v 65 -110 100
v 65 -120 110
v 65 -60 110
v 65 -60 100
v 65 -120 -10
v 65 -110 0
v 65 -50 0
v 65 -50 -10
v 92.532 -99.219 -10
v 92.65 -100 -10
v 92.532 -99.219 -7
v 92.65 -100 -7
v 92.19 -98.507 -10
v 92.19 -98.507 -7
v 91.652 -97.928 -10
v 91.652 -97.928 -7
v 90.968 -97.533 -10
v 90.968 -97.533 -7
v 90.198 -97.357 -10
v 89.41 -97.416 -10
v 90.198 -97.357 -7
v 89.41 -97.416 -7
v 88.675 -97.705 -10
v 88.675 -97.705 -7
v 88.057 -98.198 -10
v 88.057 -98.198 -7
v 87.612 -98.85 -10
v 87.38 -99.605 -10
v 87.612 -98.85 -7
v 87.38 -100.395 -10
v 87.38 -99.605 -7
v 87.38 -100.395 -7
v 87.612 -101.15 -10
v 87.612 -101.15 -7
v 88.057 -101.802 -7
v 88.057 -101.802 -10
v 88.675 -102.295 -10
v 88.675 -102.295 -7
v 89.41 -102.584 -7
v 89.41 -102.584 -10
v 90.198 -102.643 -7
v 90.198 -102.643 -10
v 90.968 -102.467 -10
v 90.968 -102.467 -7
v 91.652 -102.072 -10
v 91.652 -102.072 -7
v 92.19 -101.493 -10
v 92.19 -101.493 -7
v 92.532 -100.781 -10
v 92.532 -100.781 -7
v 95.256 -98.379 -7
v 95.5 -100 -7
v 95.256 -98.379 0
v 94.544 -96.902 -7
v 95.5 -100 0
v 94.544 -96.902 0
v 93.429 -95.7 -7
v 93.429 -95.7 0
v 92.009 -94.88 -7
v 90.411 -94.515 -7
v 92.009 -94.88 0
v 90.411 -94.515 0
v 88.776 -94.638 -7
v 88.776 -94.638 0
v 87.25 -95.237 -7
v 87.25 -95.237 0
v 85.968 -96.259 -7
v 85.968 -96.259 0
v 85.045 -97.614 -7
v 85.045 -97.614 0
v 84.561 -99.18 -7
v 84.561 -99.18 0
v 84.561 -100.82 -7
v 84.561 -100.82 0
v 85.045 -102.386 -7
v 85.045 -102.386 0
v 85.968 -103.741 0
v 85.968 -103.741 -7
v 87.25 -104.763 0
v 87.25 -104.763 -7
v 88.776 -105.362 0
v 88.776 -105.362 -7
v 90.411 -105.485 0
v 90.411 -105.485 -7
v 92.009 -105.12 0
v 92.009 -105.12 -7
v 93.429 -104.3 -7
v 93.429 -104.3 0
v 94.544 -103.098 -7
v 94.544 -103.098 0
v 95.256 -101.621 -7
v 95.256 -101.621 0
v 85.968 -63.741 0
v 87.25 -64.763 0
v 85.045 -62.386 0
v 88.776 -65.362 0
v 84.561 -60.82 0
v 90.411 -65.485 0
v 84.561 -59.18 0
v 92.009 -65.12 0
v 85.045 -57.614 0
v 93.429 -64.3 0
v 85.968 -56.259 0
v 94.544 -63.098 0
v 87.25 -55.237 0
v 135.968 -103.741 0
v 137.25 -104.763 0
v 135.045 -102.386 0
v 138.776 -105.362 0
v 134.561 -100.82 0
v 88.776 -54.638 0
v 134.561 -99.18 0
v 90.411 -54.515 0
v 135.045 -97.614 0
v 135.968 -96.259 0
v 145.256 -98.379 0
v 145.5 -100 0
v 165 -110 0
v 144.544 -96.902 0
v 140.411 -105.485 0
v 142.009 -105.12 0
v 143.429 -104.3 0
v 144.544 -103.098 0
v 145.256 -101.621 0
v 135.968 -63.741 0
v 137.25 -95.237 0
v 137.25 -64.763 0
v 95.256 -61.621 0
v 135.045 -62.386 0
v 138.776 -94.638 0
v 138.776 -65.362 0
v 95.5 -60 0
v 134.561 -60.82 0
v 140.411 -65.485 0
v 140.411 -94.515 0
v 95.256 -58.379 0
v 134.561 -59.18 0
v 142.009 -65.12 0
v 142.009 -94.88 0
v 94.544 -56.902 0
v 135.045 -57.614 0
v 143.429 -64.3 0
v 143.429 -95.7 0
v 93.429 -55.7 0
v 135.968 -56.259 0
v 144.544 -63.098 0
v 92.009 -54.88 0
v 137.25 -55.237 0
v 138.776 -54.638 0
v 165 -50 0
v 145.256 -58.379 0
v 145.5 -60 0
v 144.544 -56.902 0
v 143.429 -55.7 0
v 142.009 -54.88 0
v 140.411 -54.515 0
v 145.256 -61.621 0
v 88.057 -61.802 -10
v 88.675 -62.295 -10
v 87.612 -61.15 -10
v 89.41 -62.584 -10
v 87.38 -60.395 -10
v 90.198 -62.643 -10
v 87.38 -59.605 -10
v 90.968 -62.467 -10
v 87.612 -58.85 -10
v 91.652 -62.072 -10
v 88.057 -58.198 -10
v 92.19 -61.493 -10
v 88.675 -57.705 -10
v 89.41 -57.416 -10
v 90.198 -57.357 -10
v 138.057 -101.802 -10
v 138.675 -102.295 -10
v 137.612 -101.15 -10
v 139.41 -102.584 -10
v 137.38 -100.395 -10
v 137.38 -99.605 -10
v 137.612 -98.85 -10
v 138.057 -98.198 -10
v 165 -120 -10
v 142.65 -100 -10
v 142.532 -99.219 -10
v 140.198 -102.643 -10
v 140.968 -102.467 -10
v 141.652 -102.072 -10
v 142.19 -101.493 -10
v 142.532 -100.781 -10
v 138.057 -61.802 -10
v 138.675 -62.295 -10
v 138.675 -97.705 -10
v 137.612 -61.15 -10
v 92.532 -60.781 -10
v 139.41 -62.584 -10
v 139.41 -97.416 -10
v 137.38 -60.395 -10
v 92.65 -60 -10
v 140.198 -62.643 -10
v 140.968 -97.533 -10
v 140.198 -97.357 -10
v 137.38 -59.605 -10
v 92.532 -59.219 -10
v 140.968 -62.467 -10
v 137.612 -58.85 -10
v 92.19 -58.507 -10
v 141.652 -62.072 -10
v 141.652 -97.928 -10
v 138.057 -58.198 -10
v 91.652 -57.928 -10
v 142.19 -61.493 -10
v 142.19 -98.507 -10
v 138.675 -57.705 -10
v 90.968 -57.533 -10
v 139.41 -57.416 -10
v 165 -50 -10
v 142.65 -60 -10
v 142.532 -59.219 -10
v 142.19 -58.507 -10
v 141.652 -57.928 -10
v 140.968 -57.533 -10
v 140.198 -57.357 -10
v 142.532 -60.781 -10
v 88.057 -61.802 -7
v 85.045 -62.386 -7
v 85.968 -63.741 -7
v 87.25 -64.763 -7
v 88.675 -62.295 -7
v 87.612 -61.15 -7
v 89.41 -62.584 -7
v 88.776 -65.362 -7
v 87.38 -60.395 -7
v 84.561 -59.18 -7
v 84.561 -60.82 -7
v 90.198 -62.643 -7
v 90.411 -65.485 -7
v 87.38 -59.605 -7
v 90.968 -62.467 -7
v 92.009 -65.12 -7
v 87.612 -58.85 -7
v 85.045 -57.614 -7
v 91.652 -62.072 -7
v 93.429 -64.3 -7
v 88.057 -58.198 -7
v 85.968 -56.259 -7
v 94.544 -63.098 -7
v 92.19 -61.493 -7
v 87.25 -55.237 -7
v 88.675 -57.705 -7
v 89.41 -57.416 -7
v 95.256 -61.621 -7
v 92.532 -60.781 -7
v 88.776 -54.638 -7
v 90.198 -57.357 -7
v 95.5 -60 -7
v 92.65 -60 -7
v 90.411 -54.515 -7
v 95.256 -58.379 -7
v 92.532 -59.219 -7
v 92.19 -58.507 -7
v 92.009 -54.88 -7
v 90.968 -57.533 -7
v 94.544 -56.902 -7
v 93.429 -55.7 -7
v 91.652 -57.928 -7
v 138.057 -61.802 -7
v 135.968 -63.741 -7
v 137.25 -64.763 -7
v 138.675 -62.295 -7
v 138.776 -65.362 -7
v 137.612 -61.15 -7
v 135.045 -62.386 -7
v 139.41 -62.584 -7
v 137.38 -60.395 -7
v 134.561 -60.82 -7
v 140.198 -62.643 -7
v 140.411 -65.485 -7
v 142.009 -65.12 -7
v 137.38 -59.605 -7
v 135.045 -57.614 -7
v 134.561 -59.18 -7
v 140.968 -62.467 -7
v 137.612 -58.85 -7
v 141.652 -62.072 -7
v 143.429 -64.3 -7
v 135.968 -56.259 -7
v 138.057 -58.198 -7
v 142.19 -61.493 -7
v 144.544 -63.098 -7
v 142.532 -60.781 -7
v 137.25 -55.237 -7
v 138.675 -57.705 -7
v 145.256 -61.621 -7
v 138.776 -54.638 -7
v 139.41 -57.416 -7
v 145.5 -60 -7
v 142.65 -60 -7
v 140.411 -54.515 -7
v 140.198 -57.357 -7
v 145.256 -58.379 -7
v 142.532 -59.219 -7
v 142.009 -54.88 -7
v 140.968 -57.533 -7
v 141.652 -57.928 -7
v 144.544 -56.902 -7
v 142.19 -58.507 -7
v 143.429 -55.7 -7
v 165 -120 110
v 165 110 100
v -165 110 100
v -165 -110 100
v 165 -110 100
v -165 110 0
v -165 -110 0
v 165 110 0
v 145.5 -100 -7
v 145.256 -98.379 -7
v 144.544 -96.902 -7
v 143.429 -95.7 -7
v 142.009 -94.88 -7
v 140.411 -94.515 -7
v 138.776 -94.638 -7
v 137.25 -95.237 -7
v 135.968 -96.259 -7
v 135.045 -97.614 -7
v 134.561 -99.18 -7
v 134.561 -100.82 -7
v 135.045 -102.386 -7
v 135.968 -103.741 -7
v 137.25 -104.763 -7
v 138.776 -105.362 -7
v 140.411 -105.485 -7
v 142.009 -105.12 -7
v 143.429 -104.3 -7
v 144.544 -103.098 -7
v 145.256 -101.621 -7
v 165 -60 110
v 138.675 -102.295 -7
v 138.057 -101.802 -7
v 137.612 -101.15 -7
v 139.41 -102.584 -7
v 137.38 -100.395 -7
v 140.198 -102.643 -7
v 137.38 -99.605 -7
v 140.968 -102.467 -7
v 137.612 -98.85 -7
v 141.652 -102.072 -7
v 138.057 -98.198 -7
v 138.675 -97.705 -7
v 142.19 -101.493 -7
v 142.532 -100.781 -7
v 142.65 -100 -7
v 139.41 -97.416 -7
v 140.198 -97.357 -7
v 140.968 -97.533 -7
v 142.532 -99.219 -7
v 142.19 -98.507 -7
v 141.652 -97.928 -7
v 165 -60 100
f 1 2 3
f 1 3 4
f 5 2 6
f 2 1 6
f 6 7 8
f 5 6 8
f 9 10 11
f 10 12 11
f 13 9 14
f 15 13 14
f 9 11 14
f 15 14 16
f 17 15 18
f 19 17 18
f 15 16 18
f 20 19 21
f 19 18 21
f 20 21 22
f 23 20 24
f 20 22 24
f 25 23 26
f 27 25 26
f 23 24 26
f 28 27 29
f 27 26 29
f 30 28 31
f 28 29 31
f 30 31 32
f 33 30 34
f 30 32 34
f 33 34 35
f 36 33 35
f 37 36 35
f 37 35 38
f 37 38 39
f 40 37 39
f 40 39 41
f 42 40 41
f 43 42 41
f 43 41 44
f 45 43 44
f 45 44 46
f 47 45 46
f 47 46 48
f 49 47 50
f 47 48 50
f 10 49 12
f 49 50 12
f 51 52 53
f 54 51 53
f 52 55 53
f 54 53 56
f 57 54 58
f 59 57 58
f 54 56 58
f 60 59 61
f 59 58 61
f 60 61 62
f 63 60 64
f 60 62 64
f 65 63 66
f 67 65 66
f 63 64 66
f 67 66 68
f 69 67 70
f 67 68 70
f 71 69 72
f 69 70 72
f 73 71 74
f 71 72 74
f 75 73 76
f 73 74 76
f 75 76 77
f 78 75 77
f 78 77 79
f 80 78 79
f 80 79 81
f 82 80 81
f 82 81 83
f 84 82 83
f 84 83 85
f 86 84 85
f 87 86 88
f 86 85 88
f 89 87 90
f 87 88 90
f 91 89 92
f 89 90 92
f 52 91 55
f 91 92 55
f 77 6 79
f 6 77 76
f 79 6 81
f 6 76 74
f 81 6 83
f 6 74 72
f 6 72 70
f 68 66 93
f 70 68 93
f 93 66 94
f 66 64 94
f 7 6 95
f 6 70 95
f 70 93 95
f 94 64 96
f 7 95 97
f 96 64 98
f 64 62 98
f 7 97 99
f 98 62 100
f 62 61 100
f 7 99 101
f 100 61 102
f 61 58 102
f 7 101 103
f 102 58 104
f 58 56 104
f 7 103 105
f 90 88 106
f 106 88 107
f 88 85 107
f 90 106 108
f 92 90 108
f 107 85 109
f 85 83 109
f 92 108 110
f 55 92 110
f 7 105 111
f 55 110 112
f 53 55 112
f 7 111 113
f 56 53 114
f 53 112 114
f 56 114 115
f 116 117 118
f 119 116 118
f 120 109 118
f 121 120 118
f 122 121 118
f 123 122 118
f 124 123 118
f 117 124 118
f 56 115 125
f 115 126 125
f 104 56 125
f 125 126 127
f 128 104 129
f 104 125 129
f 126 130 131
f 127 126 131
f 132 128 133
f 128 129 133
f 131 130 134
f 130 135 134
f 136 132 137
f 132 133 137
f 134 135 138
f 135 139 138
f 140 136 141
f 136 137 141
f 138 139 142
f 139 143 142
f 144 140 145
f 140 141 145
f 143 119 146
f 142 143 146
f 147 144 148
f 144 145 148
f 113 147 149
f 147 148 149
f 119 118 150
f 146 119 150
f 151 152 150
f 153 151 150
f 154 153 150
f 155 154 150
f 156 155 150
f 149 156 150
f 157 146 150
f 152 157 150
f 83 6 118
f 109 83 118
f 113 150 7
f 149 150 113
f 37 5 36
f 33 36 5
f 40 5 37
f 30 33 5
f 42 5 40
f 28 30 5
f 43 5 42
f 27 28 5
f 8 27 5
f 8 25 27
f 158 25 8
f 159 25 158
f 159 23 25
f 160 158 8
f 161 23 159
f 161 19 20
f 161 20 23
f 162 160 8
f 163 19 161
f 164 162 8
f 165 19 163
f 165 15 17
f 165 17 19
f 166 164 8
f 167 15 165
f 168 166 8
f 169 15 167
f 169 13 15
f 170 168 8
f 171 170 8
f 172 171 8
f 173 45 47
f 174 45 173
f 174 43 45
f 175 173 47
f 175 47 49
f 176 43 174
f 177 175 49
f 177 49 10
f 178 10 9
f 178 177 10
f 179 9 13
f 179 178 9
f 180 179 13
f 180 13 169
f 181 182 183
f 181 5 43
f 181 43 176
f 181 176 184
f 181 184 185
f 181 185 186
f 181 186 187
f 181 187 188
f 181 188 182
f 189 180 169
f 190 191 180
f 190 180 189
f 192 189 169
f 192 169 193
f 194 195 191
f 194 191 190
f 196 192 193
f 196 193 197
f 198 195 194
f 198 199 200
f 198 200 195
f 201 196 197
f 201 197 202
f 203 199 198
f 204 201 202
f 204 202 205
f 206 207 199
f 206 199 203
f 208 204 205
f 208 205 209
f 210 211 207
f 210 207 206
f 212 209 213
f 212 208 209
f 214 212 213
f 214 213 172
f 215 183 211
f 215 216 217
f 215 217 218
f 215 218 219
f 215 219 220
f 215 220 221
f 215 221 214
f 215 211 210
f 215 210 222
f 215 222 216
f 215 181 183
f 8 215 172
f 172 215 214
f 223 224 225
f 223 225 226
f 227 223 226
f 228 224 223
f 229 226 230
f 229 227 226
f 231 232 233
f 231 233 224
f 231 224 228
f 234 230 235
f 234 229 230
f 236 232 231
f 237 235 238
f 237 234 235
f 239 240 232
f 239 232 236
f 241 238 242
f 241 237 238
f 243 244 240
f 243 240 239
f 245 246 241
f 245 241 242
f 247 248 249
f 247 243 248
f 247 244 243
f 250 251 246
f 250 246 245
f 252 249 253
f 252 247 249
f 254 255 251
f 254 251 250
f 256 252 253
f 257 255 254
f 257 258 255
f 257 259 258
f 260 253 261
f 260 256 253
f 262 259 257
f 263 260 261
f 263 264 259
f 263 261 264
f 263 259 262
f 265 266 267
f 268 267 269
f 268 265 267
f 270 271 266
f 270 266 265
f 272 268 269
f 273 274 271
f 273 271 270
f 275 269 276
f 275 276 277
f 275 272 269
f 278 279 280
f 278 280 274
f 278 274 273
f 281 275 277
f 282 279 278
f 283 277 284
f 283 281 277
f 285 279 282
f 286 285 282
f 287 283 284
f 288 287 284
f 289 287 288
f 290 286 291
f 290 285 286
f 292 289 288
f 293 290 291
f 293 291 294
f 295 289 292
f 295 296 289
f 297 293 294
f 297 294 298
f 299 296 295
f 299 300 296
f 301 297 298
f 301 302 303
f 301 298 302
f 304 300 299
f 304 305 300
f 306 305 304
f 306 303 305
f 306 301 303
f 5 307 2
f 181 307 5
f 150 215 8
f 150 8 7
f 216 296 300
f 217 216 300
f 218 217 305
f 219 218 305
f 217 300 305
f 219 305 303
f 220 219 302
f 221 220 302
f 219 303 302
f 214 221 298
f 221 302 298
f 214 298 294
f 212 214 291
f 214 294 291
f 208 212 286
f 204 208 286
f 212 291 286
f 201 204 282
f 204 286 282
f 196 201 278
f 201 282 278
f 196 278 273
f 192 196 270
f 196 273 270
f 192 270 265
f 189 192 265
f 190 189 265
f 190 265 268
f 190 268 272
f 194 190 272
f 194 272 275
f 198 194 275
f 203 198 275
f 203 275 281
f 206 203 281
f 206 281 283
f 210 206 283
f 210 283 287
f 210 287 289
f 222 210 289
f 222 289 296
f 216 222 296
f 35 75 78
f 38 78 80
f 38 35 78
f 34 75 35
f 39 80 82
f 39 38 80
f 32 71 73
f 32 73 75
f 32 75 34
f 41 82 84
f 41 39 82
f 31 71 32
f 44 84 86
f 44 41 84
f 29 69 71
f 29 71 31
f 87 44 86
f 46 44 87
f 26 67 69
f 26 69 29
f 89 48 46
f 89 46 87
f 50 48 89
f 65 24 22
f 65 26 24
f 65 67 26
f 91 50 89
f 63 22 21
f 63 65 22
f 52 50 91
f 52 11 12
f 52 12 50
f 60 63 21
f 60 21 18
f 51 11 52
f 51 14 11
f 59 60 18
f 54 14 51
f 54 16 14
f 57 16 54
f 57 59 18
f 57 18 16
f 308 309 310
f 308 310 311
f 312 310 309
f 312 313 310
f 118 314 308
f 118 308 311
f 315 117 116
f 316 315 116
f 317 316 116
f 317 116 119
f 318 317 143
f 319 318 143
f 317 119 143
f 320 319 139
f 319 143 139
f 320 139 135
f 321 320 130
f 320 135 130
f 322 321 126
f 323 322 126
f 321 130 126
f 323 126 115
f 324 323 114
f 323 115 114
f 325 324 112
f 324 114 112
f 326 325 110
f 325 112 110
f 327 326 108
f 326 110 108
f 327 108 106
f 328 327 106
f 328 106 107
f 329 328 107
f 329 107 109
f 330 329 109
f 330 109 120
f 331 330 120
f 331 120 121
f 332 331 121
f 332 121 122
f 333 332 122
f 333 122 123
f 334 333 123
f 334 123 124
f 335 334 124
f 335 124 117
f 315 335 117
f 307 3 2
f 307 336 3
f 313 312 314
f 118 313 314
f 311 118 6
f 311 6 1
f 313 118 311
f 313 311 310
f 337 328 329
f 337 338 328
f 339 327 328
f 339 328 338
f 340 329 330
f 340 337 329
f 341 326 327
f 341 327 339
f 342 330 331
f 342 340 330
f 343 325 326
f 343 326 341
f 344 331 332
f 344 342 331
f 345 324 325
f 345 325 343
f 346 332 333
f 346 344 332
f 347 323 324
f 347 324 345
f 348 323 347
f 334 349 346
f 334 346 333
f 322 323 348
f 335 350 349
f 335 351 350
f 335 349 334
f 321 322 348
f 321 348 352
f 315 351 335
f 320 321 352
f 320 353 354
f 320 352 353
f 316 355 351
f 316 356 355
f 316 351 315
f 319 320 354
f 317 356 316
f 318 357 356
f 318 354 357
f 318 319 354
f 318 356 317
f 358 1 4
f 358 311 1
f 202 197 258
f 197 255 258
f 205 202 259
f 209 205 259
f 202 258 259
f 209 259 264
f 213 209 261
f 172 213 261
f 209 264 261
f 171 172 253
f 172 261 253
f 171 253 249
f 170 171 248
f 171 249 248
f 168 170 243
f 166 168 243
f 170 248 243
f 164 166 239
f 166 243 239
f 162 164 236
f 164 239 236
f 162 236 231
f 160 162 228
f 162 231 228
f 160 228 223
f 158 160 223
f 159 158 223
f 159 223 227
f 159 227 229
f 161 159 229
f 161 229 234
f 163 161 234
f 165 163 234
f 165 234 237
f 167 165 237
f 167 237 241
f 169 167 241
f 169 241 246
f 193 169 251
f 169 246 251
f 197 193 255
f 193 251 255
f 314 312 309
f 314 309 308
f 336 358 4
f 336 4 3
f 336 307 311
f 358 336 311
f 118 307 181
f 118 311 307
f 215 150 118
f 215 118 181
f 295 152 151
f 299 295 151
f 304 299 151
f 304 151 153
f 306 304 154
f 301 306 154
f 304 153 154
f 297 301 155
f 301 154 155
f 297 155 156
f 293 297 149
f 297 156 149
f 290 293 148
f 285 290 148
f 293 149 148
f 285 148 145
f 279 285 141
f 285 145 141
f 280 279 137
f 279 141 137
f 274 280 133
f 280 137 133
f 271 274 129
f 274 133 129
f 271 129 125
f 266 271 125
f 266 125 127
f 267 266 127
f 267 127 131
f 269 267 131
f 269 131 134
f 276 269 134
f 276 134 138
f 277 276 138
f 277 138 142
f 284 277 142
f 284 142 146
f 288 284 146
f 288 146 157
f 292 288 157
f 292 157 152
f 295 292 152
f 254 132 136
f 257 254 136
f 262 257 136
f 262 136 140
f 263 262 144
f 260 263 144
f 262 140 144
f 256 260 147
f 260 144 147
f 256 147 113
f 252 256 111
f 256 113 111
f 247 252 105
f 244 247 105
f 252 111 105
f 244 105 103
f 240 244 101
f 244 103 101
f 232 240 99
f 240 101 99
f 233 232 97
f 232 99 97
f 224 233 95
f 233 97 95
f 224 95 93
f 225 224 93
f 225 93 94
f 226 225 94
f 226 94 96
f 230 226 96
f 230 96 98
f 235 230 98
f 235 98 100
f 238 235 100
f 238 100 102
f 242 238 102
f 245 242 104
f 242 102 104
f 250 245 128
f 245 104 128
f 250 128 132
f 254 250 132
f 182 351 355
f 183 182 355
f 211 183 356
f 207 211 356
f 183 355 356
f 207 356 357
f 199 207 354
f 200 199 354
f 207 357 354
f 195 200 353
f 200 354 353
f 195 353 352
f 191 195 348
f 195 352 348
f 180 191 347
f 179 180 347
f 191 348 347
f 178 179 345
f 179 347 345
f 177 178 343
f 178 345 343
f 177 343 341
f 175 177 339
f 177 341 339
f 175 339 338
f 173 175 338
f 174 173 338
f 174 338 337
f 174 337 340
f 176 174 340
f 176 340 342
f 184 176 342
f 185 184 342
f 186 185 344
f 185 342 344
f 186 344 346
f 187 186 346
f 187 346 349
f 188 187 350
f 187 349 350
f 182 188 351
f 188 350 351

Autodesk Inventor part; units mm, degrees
ref_plane "YZ Plane" through (0, 0, 0) normal (1, 0, 0) x (0, 1, 0)
ref_plane "XZ Plane" through (0, 0, 0) normal (0, 1, 0) x (-1, 0, 0)
ref_plane "XY Plane" through (0, 0, 0) normal (0, 0, 1) x (1, 0, 0)
sketch "Sketch1" plane through (0, 0, 0) normal (0, 0, 1) x (1, 0, 0)
  line L0 (165, -110) -> (-165, -110)
  line L1 (-165, -110) -> (-165, 110)
  line L2 (-165, 110) -> (165, 110)
  line L3 (165, 110) -> (165, -110)
  line L4 (165, -110) -> (-165, 110) construction
  line L5 (-165, -110) -> (165, 110) construction
  point P0 (0, 0)
  dimension "d0" = 330
  dimension "d1" = 220
extrude "Extrusion1" add sketch "Sketch1" along normal blind 100
sketch "Sketch2" plane through (165, -110, 0) normal (1, 0, 0) x (0, 0, -1)
  line L0 (0, 0) -> (0, 220) projected
  line L1 (0, 220) -> (-100, 220) projected
  line L2 (-100, 0) -> (-100, 220) projected
  line L3 (0, 0) -> (-100, 0) projected
  line L4 (-100, 50) -> (-110, 50)
  line L5 (-110, 50) -> (-110, -10)
  line L6 (-110, -10) -> (10, -10)
  line L7 (10, -10) -> (10, 60)
  line L8 (10, 60) -> (0, 60)
  point P0 (0, 110)
  dimension "d4" = 10
  dimension "d5" = 10
  dimension "d6" = 10
  dimension "d7" = 50
  dimension "d8" = 60
extrude "Extrusion2" add sketch "Sketch2" against normal blind 100 separate body contours L0 L8 L7 L6 L5 L4 L2 L3
sketch "Sketch3" plane through (165, -110, 0) normal (0, 0, 1) x (1, 0, 0)
  line L0 (0, 60) -> (0, 0) projected
  line L1 (0, 60) -> (-100, 60) projected
  line L2 (-100, 0) -> (-100, 60) projected
  line L3 (0, 0) -> (-100, 0) projected
  line L4 (-75, 50) -> (-75, 10) construction
  line L5 (-25, 50) -> (-25, 10) construction
  circle A0 centre (-75, 50) radius 2.65
  circle A1 centre (-75, 10) radius 2.65
  circle A2 centre (-25, 10) radius 2.65
  circle A3 centre (-25, 50) radius 2.65
  line L6 (-75, 30) -> (-25, 30) construction
  line L7 (-50, 30) -> (-50, 60) construction
  line L8 (-50, 0) -> (-50, 30) construction
  circle A4 centre (-75, 10) radius 5.5
  circle A5 centre (-75, 50) radius 5.5
  circle A6 centre (-25, 50) radius 5.5
  circle A7 centre (-25, 10) radius 5.5
  point P0 (-165, 110)
  dimension "d11" = 5.3
  dimension "d12" = 40
  dimension "d13" = 50
  dimension "d16" = 11
extrude "Extrusion3" cut sketch "Sketch3" against normal through all contours A0 | A1 | A2 | A3
sketch "Sketch4" plane through (165, -110, 0) normal (0, 0, 1) x (1, 0, 0)
  point P0 (-165, 110)
extrude "Extrusion4" cut sketch "Sketch3" against normal blind 7 contours A4 | A5 | A6 | A7
properties part number "Soporte VNA"
